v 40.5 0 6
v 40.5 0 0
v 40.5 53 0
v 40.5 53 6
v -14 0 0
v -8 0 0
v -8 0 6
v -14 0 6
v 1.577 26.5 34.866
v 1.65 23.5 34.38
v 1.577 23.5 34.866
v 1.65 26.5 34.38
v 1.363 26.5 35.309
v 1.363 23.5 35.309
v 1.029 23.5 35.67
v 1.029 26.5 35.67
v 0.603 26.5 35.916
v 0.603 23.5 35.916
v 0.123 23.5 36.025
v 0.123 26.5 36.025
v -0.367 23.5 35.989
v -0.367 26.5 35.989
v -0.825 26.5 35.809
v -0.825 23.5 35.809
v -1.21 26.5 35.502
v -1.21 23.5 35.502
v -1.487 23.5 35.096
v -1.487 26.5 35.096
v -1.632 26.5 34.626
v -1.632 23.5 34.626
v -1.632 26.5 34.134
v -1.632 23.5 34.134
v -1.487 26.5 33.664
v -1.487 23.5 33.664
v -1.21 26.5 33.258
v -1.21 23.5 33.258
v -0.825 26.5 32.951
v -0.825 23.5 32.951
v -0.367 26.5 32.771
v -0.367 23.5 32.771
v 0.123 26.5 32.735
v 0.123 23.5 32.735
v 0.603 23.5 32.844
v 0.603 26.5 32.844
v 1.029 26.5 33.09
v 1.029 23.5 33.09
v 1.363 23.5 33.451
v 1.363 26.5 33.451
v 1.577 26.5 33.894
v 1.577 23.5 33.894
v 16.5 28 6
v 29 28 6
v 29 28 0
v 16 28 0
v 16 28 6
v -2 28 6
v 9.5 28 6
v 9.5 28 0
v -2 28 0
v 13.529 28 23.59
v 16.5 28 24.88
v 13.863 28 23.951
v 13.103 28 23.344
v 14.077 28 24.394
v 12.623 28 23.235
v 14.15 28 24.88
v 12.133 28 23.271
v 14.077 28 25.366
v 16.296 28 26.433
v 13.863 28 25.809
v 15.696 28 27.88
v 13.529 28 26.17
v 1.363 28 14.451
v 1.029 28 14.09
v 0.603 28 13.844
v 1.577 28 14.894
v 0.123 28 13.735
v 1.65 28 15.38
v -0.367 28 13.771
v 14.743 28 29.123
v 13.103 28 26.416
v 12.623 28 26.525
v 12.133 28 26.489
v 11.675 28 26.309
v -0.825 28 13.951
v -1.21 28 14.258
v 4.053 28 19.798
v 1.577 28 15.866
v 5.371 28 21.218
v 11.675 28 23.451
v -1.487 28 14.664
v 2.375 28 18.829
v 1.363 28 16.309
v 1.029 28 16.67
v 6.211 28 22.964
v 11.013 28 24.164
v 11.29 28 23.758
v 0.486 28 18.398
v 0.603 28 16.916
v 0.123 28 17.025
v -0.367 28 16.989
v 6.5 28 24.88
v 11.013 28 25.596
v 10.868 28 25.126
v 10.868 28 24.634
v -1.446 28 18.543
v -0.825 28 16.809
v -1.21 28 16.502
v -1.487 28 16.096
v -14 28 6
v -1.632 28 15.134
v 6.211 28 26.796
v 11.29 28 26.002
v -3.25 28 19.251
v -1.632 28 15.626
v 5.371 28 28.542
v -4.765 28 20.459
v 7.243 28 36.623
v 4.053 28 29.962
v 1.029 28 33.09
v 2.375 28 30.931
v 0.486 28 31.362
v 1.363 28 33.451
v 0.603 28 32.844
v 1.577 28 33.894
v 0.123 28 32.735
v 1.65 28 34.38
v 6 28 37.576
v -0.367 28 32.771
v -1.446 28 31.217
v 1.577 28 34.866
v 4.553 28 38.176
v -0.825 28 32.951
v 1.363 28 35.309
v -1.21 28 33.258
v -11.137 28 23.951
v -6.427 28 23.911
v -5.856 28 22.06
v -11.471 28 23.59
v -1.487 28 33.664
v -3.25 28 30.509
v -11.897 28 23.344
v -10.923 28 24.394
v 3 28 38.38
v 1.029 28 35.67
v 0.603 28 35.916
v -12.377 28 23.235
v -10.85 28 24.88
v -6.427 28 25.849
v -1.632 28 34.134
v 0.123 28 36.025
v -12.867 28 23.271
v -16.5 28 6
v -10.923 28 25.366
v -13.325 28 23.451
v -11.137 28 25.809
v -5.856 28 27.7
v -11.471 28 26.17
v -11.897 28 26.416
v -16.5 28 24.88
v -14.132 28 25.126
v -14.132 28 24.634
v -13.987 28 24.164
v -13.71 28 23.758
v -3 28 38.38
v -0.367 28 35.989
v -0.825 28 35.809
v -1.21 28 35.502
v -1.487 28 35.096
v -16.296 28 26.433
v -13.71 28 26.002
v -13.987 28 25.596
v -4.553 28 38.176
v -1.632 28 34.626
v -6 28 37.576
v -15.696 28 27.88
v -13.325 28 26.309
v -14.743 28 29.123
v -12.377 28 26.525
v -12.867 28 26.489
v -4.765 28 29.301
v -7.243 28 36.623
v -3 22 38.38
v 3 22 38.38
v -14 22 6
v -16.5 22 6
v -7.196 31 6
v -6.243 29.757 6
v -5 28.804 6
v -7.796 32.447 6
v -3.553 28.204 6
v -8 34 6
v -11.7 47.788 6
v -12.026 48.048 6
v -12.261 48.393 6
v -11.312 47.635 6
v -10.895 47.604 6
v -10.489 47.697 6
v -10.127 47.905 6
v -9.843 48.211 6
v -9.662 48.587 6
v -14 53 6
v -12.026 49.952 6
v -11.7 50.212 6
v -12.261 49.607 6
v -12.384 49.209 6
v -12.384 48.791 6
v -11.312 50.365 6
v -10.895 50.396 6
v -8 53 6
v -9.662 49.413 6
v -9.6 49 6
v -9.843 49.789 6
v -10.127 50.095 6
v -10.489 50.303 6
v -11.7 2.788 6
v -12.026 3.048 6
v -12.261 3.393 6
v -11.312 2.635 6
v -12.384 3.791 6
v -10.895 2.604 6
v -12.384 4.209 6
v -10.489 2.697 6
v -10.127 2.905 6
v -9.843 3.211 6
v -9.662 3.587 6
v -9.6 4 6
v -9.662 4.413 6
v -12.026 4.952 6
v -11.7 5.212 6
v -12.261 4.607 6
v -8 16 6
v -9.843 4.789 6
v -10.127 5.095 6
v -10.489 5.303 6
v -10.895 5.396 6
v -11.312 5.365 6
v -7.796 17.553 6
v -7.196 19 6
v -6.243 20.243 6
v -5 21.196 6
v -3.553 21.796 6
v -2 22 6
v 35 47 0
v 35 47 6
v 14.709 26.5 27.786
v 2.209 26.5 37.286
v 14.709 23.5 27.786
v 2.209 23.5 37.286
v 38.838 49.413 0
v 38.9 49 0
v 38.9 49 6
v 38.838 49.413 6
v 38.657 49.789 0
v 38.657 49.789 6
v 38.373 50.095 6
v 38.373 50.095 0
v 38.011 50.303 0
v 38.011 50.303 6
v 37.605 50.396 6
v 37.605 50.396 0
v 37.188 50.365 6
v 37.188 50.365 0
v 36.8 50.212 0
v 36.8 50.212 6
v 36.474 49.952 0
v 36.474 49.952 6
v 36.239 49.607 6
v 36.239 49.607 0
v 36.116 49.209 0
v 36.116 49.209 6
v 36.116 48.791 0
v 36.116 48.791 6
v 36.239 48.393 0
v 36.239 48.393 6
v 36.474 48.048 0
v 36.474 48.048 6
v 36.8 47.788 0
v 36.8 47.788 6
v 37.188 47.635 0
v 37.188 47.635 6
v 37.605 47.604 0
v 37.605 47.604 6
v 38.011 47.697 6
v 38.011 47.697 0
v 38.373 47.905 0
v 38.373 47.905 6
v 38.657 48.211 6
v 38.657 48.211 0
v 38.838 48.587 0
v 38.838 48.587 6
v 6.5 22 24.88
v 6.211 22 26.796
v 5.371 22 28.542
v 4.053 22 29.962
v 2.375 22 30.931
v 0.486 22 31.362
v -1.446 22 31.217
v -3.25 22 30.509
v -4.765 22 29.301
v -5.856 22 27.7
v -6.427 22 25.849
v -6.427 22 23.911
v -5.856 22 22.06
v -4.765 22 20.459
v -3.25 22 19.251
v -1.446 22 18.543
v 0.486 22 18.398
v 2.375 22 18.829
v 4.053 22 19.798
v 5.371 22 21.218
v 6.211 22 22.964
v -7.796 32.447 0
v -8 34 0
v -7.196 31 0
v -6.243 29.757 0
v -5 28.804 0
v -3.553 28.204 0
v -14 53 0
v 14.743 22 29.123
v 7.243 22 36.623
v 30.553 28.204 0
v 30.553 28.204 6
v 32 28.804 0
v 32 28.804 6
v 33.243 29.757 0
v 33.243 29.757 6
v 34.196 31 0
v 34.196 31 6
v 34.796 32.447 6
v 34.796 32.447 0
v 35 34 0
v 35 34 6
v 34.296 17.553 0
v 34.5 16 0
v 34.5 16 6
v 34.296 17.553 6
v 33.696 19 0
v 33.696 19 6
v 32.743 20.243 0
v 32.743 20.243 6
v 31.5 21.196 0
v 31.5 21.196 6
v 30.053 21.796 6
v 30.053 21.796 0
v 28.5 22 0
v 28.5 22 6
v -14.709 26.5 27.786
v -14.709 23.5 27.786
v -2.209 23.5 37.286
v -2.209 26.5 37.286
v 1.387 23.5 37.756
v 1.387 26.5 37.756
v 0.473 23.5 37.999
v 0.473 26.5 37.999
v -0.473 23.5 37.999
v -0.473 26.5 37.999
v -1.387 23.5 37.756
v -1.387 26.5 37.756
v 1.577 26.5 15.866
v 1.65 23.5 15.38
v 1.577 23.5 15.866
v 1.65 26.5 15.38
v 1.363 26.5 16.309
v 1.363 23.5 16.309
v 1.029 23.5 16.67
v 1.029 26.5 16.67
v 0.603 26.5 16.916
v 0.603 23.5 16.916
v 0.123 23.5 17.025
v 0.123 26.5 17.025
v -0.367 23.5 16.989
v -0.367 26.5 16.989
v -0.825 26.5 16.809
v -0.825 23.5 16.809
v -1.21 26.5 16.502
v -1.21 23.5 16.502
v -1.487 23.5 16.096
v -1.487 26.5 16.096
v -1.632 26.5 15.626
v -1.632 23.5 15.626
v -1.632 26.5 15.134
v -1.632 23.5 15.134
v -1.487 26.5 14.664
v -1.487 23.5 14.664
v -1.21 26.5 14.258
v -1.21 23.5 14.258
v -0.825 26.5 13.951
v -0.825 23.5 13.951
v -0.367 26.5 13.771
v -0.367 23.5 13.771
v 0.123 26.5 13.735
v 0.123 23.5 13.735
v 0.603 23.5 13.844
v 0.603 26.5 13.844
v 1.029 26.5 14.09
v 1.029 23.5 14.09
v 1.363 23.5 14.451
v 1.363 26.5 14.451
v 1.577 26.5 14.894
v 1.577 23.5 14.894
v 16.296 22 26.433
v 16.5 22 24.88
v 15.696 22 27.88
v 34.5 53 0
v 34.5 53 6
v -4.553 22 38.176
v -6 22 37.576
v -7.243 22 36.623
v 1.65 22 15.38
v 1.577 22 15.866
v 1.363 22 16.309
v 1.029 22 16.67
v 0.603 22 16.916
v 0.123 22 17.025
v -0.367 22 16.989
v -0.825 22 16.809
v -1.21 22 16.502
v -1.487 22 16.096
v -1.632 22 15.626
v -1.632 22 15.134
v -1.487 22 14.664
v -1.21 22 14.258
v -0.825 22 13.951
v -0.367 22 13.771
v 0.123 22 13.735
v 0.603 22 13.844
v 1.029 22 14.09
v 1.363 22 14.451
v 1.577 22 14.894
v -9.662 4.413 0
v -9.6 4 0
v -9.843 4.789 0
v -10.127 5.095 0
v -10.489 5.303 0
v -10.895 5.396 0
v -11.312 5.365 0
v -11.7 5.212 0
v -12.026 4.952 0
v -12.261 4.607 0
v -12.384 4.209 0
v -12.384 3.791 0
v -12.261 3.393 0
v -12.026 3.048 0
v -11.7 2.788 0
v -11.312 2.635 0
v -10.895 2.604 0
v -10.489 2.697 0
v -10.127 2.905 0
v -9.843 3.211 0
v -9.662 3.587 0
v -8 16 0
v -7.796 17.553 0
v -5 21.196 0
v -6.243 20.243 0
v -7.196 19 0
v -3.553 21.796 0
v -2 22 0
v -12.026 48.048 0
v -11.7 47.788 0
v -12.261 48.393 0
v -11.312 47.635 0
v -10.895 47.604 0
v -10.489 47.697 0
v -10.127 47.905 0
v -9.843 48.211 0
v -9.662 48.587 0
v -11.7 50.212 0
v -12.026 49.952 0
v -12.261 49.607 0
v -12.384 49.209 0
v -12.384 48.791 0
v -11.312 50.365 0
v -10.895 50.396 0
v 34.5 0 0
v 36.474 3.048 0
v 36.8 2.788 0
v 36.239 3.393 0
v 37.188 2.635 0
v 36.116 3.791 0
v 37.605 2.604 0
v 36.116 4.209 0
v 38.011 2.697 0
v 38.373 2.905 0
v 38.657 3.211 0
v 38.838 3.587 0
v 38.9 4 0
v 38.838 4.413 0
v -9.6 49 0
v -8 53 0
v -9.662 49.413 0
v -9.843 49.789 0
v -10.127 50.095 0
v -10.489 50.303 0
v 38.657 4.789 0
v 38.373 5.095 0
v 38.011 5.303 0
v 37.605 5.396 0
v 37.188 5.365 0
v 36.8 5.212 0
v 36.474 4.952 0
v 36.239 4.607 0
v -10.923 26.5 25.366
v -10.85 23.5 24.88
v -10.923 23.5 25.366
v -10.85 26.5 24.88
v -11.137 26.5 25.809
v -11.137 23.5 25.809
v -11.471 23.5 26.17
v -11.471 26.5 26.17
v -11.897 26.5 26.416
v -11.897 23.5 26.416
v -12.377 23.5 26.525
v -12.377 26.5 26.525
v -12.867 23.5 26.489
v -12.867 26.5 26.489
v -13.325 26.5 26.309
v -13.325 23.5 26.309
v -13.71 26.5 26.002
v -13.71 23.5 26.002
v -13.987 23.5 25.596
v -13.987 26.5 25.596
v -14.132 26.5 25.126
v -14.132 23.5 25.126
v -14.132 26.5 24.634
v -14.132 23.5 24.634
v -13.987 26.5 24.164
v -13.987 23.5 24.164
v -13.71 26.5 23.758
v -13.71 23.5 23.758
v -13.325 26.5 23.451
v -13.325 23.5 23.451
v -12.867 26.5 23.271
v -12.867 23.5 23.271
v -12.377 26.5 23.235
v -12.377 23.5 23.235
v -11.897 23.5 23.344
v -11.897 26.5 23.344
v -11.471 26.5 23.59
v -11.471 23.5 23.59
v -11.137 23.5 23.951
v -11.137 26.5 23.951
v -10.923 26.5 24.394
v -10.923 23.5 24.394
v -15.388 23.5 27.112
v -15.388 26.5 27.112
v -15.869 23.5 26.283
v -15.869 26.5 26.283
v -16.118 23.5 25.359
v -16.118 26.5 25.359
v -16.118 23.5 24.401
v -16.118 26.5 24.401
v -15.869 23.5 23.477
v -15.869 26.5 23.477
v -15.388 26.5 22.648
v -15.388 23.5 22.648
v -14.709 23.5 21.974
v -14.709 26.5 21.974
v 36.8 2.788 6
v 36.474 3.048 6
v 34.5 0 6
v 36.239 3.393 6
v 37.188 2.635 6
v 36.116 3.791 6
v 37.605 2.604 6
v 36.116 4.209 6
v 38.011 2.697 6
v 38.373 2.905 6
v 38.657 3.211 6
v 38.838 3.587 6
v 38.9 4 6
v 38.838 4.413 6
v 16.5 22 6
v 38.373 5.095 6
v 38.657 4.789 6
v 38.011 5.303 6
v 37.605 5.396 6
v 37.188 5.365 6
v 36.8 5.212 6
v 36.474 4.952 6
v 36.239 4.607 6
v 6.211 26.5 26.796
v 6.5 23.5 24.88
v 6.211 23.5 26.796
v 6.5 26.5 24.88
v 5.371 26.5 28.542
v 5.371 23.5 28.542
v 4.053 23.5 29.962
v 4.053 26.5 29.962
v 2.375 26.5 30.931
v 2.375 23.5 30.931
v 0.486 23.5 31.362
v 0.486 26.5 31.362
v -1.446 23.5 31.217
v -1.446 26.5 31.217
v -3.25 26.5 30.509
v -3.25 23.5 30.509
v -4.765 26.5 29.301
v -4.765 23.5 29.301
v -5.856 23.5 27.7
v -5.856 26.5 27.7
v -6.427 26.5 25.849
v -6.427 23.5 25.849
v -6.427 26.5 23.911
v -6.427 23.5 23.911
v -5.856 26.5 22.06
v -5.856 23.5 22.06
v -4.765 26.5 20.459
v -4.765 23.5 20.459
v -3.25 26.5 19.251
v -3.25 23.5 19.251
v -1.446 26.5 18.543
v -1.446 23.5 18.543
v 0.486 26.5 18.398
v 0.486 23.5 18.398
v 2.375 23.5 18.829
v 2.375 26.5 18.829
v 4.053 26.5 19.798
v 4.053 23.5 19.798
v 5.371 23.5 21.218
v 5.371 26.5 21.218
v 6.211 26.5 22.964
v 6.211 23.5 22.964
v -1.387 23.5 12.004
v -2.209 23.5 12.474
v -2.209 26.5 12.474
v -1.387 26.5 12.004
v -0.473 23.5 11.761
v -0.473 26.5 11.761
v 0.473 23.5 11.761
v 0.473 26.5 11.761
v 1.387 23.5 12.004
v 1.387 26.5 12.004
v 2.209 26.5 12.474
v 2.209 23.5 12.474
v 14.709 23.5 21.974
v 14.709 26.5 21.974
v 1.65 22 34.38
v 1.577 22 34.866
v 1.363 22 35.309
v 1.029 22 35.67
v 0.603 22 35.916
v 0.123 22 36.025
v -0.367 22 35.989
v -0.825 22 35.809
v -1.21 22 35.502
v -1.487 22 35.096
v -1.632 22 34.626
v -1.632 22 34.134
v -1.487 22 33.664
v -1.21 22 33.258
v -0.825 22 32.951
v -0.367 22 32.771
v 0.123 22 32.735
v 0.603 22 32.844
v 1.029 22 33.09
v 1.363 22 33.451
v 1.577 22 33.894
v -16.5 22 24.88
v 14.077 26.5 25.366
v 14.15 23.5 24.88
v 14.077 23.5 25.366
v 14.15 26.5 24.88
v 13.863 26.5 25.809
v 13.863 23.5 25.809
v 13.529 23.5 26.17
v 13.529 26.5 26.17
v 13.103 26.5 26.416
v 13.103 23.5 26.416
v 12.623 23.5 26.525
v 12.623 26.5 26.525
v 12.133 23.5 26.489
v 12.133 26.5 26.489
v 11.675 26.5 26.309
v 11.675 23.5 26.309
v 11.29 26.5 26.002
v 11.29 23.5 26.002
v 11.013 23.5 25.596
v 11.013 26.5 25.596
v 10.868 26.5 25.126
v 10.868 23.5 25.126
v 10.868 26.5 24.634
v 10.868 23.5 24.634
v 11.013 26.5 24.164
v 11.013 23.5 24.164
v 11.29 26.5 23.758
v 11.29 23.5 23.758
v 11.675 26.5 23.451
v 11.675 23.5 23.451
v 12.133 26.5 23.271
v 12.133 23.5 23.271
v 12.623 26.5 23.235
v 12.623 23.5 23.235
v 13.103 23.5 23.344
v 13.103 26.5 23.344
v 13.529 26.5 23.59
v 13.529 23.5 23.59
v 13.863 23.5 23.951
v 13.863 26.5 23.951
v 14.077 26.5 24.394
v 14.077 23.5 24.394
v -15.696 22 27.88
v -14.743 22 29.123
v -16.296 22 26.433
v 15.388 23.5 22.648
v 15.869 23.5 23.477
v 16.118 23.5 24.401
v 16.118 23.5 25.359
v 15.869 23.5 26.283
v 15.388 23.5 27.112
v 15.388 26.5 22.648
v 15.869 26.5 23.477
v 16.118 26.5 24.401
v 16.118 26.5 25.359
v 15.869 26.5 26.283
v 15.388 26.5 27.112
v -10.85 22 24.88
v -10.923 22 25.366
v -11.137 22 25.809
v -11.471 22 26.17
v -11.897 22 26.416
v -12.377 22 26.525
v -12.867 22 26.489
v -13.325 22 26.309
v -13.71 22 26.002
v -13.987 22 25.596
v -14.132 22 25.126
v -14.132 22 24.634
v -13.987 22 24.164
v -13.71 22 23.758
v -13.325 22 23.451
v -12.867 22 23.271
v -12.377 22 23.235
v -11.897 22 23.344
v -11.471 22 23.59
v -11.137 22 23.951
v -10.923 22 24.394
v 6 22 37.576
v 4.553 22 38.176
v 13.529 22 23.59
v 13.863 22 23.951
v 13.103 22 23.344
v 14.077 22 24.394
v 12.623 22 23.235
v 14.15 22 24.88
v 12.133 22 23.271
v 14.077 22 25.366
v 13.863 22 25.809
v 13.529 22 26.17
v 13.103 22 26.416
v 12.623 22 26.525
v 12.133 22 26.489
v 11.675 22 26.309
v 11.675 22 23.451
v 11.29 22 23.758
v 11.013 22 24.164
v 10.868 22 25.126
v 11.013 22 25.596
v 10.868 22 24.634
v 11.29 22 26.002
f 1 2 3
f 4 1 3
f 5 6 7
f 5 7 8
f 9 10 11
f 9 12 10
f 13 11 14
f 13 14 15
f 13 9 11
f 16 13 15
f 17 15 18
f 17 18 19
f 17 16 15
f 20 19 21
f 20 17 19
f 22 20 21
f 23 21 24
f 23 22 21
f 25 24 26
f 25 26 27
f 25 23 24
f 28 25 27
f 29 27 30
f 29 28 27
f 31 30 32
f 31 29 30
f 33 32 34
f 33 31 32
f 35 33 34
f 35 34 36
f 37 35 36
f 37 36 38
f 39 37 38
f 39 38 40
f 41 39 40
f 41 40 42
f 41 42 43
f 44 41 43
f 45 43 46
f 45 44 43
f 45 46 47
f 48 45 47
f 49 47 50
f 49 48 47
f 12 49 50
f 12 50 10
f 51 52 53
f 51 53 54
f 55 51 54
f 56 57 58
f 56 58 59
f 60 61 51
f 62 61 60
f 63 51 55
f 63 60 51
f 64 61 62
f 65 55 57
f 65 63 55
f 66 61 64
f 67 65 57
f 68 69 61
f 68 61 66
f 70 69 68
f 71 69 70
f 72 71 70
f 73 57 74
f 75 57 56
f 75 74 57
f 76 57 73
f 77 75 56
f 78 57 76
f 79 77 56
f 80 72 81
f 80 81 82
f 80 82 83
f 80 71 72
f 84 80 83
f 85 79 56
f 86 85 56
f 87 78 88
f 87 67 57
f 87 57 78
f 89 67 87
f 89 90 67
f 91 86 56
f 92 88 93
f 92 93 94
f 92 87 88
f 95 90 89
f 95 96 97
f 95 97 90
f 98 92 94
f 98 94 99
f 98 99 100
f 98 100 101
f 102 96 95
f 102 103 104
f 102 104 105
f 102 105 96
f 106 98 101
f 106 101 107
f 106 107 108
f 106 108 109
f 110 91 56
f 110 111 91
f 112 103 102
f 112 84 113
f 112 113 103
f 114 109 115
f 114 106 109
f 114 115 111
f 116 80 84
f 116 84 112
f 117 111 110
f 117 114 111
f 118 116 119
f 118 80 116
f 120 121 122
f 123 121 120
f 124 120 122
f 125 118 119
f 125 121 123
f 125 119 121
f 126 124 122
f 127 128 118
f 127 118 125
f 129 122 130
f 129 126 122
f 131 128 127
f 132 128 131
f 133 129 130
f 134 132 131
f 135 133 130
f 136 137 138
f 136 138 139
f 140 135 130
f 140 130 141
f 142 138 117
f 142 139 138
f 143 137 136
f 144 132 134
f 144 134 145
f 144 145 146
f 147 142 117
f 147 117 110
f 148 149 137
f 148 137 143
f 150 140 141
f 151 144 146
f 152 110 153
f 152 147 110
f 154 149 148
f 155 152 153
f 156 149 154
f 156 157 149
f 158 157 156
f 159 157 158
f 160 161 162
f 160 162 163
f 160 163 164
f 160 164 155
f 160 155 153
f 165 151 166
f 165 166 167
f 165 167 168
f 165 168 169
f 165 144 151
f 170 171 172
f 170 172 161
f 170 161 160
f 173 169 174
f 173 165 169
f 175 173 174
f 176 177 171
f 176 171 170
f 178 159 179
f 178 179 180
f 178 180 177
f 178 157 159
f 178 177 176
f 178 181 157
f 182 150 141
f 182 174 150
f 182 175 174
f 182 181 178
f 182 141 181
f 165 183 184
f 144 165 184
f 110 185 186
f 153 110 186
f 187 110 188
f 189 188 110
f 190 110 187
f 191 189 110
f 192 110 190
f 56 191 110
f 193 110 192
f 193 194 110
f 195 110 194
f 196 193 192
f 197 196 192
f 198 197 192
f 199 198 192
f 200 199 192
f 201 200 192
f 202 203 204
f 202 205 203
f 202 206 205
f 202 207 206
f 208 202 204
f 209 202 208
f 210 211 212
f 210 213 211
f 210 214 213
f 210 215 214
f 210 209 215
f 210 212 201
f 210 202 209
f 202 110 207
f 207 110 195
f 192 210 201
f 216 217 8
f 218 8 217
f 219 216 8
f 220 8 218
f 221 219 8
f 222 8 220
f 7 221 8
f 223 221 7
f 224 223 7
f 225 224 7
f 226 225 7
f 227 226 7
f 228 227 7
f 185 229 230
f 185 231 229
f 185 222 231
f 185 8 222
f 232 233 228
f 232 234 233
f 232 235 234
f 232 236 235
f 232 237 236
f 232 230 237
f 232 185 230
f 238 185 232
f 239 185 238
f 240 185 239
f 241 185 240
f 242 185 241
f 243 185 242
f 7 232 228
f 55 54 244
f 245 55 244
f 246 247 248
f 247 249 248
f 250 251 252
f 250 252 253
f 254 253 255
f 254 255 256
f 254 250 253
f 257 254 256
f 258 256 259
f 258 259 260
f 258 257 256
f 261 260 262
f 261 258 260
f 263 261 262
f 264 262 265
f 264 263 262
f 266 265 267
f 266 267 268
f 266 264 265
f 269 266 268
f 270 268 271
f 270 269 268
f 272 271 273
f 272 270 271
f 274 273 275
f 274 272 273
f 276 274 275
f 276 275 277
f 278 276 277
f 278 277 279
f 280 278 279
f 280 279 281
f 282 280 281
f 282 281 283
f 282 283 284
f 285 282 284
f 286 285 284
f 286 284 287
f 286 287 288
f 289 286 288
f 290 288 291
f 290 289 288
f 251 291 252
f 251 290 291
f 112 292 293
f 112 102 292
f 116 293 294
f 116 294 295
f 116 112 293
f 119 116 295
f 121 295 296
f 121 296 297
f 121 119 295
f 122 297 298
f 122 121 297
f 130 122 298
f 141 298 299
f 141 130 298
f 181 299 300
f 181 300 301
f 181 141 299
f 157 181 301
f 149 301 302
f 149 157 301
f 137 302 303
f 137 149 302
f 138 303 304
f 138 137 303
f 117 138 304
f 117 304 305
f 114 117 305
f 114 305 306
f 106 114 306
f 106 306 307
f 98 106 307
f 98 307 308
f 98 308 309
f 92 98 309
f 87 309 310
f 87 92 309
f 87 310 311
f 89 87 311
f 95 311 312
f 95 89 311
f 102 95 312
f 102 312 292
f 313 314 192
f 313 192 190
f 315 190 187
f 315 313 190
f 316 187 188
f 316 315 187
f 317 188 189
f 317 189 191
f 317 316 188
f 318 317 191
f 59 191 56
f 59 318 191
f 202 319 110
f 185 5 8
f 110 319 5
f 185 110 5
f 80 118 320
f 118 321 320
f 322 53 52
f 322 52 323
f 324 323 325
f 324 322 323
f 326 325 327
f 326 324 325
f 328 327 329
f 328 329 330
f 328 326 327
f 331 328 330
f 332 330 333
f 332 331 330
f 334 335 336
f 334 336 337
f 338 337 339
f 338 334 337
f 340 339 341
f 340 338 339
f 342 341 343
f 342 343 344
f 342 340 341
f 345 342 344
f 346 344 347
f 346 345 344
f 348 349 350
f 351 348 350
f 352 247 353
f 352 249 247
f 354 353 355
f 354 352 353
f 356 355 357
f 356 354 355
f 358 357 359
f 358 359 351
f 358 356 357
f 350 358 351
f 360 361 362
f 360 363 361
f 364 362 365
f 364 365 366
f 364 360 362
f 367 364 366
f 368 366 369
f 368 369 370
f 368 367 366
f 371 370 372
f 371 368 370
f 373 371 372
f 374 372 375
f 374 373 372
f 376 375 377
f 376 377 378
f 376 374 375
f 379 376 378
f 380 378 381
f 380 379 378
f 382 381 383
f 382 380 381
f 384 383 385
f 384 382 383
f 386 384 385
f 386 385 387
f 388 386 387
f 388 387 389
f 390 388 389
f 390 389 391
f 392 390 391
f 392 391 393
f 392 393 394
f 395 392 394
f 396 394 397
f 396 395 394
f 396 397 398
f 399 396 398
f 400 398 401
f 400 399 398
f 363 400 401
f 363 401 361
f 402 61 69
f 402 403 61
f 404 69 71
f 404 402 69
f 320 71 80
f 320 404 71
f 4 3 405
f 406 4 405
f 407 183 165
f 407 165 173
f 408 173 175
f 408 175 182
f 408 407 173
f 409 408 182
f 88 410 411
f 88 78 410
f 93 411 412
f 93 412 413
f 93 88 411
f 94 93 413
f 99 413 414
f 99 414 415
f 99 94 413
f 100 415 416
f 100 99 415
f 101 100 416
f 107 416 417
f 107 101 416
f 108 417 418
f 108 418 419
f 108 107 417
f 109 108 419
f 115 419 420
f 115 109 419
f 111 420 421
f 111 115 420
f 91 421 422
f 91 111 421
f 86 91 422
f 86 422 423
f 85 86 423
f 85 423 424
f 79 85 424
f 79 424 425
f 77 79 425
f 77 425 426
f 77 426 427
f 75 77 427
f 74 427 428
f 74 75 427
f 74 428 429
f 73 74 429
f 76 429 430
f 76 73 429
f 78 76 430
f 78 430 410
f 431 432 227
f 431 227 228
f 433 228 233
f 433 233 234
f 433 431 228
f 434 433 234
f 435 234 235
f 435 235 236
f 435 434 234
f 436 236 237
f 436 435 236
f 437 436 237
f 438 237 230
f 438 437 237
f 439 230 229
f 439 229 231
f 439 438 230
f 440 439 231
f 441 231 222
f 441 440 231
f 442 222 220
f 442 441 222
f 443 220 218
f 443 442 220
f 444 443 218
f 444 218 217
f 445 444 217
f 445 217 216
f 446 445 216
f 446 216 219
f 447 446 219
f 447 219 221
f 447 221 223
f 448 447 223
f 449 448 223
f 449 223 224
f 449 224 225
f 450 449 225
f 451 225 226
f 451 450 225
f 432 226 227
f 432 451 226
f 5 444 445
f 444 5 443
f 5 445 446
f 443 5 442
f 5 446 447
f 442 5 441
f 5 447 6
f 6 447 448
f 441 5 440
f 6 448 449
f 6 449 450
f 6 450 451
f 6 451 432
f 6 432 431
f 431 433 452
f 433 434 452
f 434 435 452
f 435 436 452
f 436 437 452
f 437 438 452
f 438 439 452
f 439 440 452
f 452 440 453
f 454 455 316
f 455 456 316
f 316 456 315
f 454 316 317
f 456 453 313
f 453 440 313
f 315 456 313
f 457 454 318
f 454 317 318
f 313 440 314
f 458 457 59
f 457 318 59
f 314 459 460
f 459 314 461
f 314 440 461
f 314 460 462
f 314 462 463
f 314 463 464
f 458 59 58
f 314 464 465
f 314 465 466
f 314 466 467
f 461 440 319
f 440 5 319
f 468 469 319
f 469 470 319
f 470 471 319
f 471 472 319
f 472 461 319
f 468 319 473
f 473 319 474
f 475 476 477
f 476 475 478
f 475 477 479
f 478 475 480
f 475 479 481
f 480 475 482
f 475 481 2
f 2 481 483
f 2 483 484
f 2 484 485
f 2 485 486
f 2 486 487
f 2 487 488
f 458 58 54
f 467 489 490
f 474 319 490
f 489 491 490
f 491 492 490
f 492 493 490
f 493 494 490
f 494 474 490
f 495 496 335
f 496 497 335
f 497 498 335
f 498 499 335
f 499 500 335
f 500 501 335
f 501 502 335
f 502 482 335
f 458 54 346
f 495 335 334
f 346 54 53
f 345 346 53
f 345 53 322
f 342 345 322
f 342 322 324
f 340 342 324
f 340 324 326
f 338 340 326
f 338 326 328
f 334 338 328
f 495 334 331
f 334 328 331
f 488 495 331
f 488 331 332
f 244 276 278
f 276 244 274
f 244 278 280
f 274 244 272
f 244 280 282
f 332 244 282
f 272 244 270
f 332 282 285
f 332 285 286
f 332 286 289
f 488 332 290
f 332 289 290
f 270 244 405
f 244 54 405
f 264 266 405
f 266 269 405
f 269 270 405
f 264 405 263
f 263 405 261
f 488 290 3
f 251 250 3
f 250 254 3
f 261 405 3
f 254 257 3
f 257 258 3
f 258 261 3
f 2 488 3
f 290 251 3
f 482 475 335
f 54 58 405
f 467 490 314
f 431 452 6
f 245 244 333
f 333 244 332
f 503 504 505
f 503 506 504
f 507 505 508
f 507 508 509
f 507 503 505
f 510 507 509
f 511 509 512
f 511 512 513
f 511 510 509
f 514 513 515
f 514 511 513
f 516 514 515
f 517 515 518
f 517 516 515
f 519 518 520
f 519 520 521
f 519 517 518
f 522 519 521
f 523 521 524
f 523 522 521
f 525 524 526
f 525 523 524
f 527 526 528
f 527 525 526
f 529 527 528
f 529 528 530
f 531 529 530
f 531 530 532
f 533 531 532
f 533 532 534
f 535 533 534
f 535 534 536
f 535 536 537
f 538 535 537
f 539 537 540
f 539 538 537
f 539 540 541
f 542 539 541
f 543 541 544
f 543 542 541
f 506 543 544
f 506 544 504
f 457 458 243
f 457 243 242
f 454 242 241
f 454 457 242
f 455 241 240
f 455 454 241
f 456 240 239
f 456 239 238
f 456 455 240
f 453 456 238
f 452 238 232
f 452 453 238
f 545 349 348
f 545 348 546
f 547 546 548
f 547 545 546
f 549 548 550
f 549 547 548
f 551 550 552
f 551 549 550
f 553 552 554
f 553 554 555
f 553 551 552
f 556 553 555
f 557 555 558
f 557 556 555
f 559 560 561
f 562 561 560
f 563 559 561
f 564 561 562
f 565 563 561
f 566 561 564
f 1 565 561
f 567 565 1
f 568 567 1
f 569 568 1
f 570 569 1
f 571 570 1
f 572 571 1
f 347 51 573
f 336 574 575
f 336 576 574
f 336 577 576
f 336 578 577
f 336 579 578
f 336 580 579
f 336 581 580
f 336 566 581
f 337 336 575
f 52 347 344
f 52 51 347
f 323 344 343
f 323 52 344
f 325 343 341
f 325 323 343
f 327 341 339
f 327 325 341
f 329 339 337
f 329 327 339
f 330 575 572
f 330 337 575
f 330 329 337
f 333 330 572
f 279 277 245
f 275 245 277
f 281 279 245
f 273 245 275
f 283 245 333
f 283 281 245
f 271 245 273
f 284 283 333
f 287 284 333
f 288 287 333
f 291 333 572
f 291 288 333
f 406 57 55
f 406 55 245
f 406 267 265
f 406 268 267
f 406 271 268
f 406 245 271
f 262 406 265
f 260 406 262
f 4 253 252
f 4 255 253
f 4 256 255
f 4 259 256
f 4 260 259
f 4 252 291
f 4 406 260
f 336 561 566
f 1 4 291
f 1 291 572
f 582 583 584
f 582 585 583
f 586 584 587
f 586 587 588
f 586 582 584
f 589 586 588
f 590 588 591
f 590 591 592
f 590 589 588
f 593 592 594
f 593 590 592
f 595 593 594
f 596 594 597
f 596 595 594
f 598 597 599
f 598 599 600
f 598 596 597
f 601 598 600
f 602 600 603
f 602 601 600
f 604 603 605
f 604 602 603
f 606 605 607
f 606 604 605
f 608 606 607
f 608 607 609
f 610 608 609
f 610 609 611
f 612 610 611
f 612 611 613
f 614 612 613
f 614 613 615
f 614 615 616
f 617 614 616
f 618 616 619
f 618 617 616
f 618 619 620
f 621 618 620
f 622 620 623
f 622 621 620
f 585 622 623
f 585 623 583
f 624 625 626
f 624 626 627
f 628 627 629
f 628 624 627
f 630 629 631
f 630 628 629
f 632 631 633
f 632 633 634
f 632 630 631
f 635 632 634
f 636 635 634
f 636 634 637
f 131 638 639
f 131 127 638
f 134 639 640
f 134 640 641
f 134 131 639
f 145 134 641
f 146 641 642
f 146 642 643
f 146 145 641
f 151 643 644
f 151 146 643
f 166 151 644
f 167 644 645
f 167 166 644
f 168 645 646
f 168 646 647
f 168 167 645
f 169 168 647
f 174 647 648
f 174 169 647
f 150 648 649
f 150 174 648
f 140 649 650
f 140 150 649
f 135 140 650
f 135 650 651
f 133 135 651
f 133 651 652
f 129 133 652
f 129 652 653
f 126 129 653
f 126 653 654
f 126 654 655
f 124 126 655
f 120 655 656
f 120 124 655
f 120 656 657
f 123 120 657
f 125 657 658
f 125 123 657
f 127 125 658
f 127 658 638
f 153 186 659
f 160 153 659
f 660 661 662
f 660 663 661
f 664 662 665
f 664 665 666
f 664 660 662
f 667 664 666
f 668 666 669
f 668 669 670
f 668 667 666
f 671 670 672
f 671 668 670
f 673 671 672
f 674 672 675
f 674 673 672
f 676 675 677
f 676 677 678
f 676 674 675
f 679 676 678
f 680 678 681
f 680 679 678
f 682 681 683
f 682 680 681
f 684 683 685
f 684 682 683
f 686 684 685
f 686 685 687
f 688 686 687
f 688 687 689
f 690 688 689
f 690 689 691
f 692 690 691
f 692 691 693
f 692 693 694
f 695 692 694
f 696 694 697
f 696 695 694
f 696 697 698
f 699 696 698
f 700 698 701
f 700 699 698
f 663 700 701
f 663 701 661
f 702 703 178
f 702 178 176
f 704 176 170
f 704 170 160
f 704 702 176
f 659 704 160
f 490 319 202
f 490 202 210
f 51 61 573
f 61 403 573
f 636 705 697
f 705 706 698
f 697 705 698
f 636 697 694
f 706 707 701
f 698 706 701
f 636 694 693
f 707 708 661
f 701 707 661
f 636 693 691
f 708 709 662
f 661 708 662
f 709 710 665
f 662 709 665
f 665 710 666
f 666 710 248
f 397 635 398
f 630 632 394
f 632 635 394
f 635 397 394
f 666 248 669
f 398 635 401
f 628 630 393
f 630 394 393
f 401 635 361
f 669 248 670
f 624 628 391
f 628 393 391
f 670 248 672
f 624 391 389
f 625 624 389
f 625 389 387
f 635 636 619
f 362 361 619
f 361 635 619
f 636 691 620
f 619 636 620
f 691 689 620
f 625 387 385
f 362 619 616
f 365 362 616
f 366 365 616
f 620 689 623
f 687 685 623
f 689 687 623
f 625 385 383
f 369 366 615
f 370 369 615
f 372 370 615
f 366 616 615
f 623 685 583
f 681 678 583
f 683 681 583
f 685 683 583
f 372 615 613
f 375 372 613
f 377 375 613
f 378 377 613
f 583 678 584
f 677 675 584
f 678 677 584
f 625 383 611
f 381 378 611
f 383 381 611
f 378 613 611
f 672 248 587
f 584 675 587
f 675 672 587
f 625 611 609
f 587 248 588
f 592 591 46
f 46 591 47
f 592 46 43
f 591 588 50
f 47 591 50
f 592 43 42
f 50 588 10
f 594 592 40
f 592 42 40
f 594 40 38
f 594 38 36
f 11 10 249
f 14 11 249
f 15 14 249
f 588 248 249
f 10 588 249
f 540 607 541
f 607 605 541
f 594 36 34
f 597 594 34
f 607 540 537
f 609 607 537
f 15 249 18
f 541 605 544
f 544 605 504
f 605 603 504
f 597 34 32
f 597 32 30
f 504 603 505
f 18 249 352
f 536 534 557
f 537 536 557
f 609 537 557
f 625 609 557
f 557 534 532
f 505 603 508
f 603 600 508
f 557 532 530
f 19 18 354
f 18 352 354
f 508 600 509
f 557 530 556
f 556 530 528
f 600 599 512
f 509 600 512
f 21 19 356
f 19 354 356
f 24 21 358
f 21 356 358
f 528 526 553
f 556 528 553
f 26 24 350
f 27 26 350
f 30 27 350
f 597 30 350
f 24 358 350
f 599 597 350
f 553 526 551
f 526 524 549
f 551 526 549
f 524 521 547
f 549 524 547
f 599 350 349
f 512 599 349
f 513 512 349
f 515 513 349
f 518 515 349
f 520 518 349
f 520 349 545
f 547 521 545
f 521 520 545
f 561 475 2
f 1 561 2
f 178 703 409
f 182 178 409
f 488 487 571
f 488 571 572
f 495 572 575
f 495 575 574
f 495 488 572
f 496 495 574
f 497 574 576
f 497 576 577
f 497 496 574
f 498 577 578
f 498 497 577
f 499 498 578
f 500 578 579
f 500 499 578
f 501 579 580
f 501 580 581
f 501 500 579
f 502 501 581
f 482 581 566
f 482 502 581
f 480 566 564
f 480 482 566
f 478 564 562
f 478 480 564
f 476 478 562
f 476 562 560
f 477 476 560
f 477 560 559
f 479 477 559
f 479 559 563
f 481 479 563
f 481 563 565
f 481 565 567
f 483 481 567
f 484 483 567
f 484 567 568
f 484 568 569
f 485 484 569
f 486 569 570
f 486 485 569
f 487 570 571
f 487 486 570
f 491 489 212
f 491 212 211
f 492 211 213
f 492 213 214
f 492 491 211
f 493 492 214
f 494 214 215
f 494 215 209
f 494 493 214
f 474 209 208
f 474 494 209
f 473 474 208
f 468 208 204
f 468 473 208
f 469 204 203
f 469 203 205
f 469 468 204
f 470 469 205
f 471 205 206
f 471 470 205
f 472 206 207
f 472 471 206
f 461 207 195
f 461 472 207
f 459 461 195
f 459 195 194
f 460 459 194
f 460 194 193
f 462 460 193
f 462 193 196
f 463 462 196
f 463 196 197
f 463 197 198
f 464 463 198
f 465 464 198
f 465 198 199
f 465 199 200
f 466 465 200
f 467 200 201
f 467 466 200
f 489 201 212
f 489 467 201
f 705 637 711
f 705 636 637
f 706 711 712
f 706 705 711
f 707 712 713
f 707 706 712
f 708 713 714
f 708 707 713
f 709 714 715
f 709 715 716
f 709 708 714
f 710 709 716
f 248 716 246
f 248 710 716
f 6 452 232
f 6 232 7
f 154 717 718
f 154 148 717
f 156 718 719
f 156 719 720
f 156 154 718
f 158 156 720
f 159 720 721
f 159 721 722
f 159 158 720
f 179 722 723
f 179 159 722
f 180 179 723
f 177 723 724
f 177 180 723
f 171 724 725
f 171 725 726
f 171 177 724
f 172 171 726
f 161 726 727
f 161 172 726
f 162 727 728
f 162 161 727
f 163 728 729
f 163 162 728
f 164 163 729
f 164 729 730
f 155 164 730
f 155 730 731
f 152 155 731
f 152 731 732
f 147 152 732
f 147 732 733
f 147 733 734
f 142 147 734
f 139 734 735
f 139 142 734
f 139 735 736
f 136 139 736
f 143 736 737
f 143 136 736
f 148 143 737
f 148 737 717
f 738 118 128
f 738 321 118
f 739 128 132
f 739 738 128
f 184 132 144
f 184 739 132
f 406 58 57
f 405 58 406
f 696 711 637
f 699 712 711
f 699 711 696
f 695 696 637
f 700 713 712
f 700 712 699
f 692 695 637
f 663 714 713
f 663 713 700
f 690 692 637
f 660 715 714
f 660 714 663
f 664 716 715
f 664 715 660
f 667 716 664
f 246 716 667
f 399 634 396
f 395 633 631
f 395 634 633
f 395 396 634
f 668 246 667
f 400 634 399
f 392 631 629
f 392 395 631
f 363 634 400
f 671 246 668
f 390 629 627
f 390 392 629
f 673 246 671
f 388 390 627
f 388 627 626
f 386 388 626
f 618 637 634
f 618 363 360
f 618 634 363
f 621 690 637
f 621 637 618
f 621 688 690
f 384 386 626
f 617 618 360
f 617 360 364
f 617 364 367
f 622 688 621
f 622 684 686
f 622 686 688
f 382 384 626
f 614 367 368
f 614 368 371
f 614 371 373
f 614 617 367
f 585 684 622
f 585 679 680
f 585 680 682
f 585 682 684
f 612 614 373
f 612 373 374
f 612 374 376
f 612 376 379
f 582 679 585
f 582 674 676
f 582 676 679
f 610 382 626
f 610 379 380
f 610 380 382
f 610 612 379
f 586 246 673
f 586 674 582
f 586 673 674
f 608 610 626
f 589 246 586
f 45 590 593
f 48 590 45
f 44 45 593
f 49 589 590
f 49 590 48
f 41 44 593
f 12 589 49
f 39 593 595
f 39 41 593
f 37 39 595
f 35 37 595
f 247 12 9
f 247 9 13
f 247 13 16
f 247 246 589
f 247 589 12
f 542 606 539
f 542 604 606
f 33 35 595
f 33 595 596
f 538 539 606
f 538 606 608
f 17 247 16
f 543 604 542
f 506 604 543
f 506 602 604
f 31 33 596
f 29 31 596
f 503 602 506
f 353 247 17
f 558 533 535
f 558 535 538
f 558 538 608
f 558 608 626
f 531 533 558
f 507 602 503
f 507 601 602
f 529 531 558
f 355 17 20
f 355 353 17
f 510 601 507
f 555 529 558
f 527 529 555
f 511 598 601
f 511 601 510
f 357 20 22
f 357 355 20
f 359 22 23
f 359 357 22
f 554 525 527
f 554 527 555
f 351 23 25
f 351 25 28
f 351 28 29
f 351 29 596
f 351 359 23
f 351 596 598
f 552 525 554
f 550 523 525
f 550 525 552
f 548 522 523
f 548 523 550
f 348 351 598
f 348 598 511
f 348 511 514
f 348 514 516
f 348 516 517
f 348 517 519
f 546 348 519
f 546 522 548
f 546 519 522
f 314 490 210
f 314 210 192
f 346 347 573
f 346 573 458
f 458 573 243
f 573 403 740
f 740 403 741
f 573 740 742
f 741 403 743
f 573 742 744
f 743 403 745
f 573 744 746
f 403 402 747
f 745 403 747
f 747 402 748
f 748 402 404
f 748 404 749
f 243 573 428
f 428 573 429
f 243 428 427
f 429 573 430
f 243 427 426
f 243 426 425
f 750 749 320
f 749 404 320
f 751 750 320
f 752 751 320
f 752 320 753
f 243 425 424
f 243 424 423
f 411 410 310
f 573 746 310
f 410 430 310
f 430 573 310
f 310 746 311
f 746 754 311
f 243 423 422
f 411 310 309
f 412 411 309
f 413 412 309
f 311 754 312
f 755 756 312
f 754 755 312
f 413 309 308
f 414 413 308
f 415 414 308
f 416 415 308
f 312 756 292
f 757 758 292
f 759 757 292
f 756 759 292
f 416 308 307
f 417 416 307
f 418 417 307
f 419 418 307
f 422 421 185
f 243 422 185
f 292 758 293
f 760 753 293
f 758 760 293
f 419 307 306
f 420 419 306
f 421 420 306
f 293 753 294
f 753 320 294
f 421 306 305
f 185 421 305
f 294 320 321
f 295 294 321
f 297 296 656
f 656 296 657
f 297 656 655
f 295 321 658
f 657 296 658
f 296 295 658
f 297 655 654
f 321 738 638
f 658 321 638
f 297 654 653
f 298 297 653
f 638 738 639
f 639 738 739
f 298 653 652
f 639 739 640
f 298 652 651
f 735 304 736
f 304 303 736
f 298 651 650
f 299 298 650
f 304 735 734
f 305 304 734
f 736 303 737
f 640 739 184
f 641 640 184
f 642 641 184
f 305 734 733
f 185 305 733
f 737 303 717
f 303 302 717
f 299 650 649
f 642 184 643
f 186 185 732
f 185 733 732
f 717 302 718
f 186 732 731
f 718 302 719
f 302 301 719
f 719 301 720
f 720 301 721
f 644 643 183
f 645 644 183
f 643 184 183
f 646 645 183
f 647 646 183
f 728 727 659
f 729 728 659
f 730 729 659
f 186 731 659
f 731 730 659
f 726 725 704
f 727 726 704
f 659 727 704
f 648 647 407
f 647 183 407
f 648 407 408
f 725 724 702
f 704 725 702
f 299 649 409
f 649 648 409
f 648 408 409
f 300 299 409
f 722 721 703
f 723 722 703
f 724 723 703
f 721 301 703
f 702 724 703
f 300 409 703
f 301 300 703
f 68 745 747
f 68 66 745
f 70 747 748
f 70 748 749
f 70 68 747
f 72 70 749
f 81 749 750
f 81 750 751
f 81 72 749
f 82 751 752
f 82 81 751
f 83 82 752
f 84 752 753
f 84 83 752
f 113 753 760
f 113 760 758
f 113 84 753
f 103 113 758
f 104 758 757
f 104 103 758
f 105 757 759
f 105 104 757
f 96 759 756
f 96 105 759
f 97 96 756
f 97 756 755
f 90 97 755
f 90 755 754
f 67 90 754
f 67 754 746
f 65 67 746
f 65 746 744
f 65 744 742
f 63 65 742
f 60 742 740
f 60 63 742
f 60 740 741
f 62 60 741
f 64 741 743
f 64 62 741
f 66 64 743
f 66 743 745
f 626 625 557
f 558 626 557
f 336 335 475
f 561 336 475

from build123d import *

# Parameters (mm, degrees)
SKETCH_R      = 1.65
SKETCH_R_2    = 6.5
PAD_DEPTH     = 3
SKETCH002_R   = 1.4
PAD001_DEPTH  = 6
SKETCH003_R   = 1.65
SKETCH003_R_2 = 6.5
PAD002_DEPTH  = 1.5


with BuildPart() as body:
    # Sketch → Pad (new body, symmetric)
    with BuildSketch(Plane(origin=(0, 25, 24.88), x_dir=(1, 0, 0), z_dir=(0, -1, 0))):
        with BuildLine():
            Line((-3, 13.5), (3, 13.5))
            ThreePointArc((7.242641, 11.742641), (5.296101, 13.043277), (3, 13.5))
            Line((7.242641, 11.742641), (14.742641, 4.242641))
            ThreePointArc((16.5, 0), (16.043277, 2.296101), (14.742641, 4.242641))
            Line((16.5, 0), (16.5, -18.88))
            Line((16.5, -18.88), (40.5, -18.88))
            Line((40.5, -18.88), (40.5, -24.88))
            Line((40.5, -24.88), (-14, -24.88))
            Line((-14, -24.88), (-14, -18.88))
            Line((-14, -18.88), (-16.5, -18.88))
            Line((-16.5, -18.88), (-16.5, 0))
            ThreePointArc((-14.742641, 4.242641), (-16.043277, 2.296101), (-16.5, 0))
            Line((-14.742641, 4.242641), (-7.242641, 11.742641))
            ThreePointArc((-3, 13.5), (-5.296101, 13.043277), (-7.242641, 11.742641))
        make_face()
        with Locations((-12.5, 0)):
            Circle(SKETCH_R, mode=Mode.SUBTRACT)
        with Locations((12.5, 0)):
            Circle(SKETCH_R, mode=Mode.SUBTRACT)
        with Locations((0, 9.5)):
            Circle(SKETCH_R, mode=Mode.SUBTRACT)
        with Locations((0, -9.5)):
            Circle(SKETCH_R, mode=Mode.SUBTRACT)
        Circle(SKETCH_R_2, mode=Mode.SUBTRACT)
    extrude(amount=PAD_DEPTH, both=True)

    # Sketch002 → Pad001 (join)
    with BuildSketch(Plane.XY):
        with BuildLine():
            Line((34.5, 0), (40.5, 0))
            Line((40.5, 0), (40.5, 53))
            Line((40.5, 53), (34.5, 53))
            Line((9.5, 28), (34.5, 53))
            Line((-2, 28), (9.5, 28))
            ThreePointArc((-8, 34), (-6.242641, 29.757359), (-2, 28))
            Line((-8, 53), (-8, 34))
            Line((-14, 53), (-8, 53))
            Line((-14, 0), (-14, 53))
            Line((-8, 0), (-14, 0))
            Line((-8, 16), (-8, 0))
            ThreePointArc((-2, 22), (-6.242641, 20.242641), (-8, 16))
            Line((28.5, 22), (-2, 22))
            ThreePointArc((34.5, 16), (32.742641, 20.242641), (28.5, 22))
            Line((34.5, 16), (34.5, 0))
        make_face()
        with Locations((-11, 49)):
            Circle(SKETCH002_R, mode=Mode.SUBTRACT)
        with Locations((37.5, 49)):
            Circle(SKETCH002_R, mode=Mode.SUBTRACT)
        with Locations((-11, 4)):
            Circle(SKETCH002_R, mode=Mode.SUBTRACT)
        with Locations((37.5, 4)):
            Circle(SKETCH002_R, mode=Mode.SUBTRACT)
        with BuildLine():
            Line((35, 47), (35, 34))
            ThreePointArc((29, 28), (33.242641, 29.757359), (35, 34))
            Line((16, 28), (29, 28))
            Line((16, 28), (35, 47))
        make_face(mode=Mode.SUBTRACT)
    extrude(amount=PAD001_DEPTH)


with BuildPart() as body001:
    # Sketch003 → Pad002 (new body, symmetric)
    with BuildSketch(Plane(origin=(0, 25, 24.88), x_dir=(1, 0, 0), z_dir=(0, -1, 0))):
        with BuildLine():
            Line((-14.708554, 2.905992), (-2.208554, 12.405992))
            ThreePointArc((2.208554, 12.405992), (0, 13.15), (-2.208554, 12.405992))
            Line((2.208554, 12.405992), (14.708554, 2.905992))
            ThreePointArc((14.708554, -2.905992), (16.15, 0), (14.708554, 2.905992))
            Line((2.208554, -12.405992), (14.708554, -2.905992))
            ThreePointArc((-2.208554, -12.405992), (0, -13.15), (2.208554, -12.405992))
            Line((-2.208554, -12.405992), (-14.708554, -2.905992))
            ThreePointArc((-14.708554, 2.905992), (-16.15, 0), (-14.708554, -2.905992))
        make_face()
        with Locations((-12.5, 0)):
            Circle(SKETCH003_R, mode=Mode.SUBTRACT)
        with Locations((12.5, 0)):
            Circle(SKETCH003_R, mode=Mode.SUBTRACT)
        with Locations((0, 9.5)):
            Circle(SKETCH003_R, mode=Mode.SUBTRACT)
        with Locations((0, -9.5)):
            Circle(SKETCH003_R, mode=Mode.SUBTRACT)
        Circle(SKETCH003_R_2, mode=Mode.SUBTRACT)
    extrude(amount=PAD002_DEPTH, both=True)


solid = Compound([body.part, body001.part])
